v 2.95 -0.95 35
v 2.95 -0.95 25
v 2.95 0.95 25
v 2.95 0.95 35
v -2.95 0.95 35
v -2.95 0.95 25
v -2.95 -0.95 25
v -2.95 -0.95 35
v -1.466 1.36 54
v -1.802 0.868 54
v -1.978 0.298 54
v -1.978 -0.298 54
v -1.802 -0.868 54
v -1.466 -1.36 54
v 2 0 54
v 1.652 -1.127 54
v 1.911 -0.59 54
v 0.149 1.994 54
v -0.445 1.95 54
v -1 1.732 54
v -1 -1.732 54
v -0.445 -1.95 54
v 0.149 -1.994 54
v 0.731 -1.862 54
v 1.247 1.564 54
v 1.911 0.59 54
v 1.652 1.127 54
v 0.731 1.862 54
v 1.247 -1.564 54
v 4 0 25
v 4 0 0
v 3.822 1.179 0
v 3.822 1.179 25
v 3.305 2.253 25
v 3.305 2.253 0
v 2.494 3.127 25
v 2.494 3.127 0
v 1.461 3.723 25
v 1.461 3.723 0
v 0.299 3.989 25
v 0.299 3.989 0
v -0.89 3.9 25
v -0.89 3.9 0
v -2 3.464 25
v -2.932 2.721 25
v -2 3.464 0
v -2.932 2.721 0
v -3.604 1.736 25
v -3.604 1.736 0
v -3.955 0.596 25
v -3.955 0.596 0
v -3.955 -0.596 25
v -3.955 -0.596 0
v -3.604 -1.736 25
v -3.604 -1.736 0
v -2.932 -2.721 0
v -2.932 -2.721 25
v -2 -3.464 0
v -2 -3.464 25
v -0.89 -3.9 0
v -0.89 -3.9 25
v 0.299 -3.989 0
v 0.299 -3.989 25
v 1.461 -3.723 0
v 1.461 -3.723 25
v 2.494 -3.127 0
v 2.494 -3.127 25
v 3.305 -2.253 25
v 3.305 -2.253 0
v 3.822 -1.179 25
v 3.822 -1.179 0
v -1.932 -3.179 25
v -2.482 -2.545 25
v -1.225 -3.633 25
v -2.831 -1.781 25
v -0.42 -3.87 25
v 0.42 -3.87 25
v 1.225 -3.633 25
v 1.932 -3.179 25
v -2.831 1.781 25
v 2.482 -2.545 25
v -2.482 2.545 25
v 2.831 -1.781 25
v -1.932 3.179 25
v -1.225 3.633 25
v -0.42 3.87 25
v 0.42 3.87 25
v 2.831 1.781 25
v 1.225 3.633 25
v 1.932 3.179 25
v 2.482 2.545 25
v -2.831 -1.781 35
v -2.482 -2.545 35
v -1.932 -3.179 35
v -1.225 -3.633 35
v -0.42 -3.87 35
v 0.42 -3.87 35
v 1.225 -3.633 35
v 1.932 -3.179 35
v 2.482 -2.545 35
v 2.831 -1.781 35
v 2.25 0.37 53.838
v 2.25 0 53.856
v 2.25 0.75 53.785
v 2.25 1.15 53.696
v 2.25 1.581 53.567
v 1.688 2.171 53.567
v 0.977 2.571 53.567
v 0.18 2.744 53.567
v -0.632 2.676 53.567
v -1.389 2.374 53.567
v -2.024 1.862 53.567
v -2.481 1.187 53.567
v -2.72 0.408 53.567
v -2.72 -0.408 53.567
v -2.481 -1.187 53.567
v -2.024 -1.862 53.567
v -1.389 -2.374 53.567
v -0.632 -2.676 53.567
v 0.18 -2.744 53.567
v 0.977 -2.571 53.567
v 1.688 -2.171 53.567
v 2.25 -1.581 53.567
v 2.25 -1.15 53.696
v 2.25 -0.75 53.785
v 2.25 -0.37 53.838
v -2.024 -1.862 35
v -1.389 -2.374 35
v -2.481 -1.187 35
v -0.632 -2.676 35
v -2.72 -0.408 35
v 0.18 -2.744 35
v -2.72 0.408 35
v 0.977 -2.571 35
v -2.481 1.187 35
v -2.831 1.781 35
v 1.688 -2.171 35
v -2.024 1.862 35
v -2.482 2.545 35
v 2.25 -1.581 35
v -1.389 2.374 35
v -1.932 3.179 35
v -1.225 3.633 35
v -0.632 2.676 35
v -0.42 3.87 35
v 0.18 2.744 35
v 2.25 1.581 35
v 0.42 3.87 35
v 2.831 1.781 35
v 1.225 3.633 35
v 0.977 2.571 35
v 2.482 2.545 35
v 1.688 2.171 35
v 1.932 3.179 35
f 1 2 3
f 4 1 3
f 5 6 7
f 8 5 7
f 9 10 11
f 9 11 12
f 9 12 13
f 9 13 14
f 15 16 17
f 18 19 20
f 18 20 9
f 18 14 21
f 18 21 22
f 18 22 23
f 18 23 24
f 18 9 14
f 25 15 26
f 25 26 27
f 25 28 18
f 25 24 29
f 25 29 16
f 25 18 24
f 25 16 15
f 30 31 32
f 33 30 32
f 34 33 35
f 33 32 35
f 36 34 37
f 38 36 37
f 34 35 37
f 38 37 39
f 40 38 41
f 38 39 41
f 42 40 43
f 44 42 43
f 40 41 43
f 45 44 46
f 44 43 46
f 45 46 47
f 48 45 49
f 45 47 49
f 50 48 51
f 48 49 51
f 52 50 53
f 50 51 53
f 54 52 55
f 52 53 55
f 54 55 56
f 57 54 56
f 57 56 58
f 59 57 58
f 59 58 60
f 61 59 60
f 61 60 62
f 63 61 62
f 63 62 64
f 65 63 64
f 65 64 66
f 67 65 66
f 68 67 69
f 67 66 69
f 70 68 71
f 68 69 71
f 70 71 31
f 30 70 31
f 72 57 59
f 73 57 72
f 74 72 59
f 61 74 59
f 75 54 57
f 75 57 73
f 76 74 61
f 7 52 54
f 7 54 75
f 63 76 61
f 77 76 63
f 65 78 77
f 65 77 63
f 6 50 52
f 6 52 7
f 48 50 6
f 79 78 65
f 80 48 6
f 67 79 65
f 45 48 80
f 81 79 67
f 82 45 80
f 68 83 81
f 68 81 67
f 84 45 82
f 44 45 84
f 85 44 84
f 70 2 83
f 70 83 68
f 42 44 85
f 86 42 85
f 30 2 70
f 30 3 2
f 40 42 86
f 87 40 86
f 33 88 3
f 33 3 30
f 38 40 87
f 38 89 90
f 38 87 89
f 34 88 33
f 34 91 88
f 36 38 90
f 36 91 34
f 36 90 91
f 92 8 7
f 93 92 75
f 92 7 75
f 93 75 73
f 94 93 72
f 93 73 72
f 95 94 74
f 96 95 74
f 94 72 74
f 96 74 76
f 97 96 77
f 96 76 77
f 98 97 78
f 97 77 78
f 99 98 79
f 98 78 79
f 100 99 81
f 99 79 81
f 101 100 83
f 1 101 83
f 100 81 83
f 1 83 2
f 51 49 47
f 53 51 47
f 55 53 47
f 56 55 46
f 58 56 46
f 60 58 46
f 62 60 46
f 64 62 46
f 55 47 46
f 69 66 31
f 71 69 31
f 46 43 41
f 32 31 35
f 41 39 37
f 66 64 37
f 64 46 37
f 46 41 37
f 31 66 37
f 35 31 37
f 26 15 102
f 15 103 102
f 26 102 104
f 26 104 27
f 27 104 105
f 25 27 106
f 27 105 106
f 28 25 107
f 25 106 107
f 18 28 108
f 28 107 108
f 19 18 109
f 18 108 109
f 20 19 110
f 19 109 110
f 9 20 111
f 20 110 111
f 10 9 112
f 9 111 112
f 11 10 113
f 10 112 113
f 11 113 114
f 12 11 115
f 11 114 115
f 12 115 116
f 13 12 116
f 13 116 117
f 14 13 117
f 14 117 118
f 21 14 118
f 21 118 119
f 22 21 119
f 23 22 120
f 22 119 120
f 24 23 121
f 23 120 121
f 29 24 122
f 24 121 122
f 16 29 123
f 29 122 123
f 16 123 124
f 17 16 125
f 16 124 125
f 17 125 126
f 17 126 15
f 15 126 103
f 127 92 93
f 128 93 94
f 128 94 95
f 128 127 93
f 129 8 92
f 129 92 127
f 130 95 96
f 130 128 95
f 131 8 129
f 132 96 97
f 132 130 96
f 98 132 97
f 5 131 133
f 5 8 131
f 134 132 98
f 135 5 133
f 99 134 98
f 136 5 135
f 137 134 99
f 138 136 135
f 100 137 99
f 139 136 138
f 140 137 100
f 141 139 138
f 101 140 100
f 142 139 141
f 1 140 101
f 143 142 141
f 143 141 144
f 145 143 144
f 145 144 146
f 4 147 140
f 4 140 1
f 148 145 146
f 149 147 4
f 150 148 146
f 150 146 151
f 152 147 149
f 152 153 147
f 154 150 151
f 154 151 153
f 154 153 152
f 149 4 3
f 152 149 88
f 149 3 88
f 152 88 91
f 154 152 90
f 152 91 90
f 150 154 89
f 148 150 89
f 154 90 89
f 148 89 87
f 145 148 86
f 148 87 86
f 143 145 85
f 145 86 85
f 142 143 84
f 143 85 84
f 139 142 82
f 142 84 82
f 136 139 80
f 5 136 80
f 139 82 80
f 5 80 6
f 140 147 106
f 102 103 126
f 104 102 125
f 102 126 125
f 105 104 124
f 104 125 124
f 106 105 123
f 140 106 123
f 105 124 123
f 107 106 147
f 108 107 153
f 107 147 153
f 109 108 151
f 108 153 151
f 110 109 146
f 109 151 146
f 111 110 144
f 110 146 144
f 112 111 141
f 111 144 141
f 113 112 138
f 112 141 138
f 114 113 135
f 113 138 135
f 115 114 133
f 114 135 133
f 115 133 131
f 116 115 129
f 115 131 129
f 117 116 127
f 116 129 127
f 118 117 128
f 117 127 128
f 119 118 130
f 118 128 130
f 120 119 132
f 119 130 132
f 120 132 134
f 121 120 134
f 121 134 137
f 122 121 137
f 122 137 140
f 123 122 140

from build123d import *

# Parameters (mm, degrees)
F0_R     = 4
F1_DEPTH = 25
F3_DEPTH = 10
F4_R     = 2.75
F5_DEPTH = 19
F6_SIZE2 = 0.4330127019
F6_SIZE  = 0.75
F8_DEPTH = 19


with BuildPart() as f1:
    # F0 (on Top) → F1 (new body)
    with BuildSketch(Plane.XY):
        Circle(F0_R)
    extrude(amount=F1_DEPTH)

    # F2 (on face) → F3 (join)
    with BuildSketch(Plane.XY.offset(25)):
        with BuildLine():
            ThreePointArc((0, -3.9), (2.0859650045, -3.0359650045), (2.95, -0.95))
            Line((2.95, -0.95), (2.95, 0.95))
            ThreePointArc((2.95, 0.95), (2.0859650045, 3.0359650045), (0, 3.9))
            ThreePointArc((0, 3.9), (-2.0859650045, 3.0359650045), (-2.95, 0.95))
            Line((-2.95, 0.95), (-2.95, -0.95))
            ThreePointArc((-2.95, -0.95), (-2.0859650045, -3.0359650045), (0, -3.9))
        make_face()
    extrude(amount=F3_DEPTH)

    # F4 (on face) → F5 (join)
    with BuildSketch(Plane.XY.offset(35)):
        Circle(F4_R)
    extrude(amount=F5_DEPTH)

    # F6
    f6_edges = [f1.edges().sort_by_distance(p)[0] for p in [
        (-2.75, 0, 54),
    ]]
    f6_side = f1.faces().sort_by_distance((0, 0, 54))[0]
    chamfer(f6_edges, length=F6_SIZE, length2=F6_SIZE2, reference=f6_side)

    # F7 (on face) → F8 (cut)
    with BuildSketch(Plane.XY.offset(54)):
        Polygon((2.25, 2.9586648743), (2.25, 0), (2.25, -3.3952166559), (3.5037237976, -3.3952166559), (3.5037237976, 2.9586648743), align=None)
    extrude(amount=-F8_DEPTH, mode=Mode.SUBTRACT)


solid = f1.part
